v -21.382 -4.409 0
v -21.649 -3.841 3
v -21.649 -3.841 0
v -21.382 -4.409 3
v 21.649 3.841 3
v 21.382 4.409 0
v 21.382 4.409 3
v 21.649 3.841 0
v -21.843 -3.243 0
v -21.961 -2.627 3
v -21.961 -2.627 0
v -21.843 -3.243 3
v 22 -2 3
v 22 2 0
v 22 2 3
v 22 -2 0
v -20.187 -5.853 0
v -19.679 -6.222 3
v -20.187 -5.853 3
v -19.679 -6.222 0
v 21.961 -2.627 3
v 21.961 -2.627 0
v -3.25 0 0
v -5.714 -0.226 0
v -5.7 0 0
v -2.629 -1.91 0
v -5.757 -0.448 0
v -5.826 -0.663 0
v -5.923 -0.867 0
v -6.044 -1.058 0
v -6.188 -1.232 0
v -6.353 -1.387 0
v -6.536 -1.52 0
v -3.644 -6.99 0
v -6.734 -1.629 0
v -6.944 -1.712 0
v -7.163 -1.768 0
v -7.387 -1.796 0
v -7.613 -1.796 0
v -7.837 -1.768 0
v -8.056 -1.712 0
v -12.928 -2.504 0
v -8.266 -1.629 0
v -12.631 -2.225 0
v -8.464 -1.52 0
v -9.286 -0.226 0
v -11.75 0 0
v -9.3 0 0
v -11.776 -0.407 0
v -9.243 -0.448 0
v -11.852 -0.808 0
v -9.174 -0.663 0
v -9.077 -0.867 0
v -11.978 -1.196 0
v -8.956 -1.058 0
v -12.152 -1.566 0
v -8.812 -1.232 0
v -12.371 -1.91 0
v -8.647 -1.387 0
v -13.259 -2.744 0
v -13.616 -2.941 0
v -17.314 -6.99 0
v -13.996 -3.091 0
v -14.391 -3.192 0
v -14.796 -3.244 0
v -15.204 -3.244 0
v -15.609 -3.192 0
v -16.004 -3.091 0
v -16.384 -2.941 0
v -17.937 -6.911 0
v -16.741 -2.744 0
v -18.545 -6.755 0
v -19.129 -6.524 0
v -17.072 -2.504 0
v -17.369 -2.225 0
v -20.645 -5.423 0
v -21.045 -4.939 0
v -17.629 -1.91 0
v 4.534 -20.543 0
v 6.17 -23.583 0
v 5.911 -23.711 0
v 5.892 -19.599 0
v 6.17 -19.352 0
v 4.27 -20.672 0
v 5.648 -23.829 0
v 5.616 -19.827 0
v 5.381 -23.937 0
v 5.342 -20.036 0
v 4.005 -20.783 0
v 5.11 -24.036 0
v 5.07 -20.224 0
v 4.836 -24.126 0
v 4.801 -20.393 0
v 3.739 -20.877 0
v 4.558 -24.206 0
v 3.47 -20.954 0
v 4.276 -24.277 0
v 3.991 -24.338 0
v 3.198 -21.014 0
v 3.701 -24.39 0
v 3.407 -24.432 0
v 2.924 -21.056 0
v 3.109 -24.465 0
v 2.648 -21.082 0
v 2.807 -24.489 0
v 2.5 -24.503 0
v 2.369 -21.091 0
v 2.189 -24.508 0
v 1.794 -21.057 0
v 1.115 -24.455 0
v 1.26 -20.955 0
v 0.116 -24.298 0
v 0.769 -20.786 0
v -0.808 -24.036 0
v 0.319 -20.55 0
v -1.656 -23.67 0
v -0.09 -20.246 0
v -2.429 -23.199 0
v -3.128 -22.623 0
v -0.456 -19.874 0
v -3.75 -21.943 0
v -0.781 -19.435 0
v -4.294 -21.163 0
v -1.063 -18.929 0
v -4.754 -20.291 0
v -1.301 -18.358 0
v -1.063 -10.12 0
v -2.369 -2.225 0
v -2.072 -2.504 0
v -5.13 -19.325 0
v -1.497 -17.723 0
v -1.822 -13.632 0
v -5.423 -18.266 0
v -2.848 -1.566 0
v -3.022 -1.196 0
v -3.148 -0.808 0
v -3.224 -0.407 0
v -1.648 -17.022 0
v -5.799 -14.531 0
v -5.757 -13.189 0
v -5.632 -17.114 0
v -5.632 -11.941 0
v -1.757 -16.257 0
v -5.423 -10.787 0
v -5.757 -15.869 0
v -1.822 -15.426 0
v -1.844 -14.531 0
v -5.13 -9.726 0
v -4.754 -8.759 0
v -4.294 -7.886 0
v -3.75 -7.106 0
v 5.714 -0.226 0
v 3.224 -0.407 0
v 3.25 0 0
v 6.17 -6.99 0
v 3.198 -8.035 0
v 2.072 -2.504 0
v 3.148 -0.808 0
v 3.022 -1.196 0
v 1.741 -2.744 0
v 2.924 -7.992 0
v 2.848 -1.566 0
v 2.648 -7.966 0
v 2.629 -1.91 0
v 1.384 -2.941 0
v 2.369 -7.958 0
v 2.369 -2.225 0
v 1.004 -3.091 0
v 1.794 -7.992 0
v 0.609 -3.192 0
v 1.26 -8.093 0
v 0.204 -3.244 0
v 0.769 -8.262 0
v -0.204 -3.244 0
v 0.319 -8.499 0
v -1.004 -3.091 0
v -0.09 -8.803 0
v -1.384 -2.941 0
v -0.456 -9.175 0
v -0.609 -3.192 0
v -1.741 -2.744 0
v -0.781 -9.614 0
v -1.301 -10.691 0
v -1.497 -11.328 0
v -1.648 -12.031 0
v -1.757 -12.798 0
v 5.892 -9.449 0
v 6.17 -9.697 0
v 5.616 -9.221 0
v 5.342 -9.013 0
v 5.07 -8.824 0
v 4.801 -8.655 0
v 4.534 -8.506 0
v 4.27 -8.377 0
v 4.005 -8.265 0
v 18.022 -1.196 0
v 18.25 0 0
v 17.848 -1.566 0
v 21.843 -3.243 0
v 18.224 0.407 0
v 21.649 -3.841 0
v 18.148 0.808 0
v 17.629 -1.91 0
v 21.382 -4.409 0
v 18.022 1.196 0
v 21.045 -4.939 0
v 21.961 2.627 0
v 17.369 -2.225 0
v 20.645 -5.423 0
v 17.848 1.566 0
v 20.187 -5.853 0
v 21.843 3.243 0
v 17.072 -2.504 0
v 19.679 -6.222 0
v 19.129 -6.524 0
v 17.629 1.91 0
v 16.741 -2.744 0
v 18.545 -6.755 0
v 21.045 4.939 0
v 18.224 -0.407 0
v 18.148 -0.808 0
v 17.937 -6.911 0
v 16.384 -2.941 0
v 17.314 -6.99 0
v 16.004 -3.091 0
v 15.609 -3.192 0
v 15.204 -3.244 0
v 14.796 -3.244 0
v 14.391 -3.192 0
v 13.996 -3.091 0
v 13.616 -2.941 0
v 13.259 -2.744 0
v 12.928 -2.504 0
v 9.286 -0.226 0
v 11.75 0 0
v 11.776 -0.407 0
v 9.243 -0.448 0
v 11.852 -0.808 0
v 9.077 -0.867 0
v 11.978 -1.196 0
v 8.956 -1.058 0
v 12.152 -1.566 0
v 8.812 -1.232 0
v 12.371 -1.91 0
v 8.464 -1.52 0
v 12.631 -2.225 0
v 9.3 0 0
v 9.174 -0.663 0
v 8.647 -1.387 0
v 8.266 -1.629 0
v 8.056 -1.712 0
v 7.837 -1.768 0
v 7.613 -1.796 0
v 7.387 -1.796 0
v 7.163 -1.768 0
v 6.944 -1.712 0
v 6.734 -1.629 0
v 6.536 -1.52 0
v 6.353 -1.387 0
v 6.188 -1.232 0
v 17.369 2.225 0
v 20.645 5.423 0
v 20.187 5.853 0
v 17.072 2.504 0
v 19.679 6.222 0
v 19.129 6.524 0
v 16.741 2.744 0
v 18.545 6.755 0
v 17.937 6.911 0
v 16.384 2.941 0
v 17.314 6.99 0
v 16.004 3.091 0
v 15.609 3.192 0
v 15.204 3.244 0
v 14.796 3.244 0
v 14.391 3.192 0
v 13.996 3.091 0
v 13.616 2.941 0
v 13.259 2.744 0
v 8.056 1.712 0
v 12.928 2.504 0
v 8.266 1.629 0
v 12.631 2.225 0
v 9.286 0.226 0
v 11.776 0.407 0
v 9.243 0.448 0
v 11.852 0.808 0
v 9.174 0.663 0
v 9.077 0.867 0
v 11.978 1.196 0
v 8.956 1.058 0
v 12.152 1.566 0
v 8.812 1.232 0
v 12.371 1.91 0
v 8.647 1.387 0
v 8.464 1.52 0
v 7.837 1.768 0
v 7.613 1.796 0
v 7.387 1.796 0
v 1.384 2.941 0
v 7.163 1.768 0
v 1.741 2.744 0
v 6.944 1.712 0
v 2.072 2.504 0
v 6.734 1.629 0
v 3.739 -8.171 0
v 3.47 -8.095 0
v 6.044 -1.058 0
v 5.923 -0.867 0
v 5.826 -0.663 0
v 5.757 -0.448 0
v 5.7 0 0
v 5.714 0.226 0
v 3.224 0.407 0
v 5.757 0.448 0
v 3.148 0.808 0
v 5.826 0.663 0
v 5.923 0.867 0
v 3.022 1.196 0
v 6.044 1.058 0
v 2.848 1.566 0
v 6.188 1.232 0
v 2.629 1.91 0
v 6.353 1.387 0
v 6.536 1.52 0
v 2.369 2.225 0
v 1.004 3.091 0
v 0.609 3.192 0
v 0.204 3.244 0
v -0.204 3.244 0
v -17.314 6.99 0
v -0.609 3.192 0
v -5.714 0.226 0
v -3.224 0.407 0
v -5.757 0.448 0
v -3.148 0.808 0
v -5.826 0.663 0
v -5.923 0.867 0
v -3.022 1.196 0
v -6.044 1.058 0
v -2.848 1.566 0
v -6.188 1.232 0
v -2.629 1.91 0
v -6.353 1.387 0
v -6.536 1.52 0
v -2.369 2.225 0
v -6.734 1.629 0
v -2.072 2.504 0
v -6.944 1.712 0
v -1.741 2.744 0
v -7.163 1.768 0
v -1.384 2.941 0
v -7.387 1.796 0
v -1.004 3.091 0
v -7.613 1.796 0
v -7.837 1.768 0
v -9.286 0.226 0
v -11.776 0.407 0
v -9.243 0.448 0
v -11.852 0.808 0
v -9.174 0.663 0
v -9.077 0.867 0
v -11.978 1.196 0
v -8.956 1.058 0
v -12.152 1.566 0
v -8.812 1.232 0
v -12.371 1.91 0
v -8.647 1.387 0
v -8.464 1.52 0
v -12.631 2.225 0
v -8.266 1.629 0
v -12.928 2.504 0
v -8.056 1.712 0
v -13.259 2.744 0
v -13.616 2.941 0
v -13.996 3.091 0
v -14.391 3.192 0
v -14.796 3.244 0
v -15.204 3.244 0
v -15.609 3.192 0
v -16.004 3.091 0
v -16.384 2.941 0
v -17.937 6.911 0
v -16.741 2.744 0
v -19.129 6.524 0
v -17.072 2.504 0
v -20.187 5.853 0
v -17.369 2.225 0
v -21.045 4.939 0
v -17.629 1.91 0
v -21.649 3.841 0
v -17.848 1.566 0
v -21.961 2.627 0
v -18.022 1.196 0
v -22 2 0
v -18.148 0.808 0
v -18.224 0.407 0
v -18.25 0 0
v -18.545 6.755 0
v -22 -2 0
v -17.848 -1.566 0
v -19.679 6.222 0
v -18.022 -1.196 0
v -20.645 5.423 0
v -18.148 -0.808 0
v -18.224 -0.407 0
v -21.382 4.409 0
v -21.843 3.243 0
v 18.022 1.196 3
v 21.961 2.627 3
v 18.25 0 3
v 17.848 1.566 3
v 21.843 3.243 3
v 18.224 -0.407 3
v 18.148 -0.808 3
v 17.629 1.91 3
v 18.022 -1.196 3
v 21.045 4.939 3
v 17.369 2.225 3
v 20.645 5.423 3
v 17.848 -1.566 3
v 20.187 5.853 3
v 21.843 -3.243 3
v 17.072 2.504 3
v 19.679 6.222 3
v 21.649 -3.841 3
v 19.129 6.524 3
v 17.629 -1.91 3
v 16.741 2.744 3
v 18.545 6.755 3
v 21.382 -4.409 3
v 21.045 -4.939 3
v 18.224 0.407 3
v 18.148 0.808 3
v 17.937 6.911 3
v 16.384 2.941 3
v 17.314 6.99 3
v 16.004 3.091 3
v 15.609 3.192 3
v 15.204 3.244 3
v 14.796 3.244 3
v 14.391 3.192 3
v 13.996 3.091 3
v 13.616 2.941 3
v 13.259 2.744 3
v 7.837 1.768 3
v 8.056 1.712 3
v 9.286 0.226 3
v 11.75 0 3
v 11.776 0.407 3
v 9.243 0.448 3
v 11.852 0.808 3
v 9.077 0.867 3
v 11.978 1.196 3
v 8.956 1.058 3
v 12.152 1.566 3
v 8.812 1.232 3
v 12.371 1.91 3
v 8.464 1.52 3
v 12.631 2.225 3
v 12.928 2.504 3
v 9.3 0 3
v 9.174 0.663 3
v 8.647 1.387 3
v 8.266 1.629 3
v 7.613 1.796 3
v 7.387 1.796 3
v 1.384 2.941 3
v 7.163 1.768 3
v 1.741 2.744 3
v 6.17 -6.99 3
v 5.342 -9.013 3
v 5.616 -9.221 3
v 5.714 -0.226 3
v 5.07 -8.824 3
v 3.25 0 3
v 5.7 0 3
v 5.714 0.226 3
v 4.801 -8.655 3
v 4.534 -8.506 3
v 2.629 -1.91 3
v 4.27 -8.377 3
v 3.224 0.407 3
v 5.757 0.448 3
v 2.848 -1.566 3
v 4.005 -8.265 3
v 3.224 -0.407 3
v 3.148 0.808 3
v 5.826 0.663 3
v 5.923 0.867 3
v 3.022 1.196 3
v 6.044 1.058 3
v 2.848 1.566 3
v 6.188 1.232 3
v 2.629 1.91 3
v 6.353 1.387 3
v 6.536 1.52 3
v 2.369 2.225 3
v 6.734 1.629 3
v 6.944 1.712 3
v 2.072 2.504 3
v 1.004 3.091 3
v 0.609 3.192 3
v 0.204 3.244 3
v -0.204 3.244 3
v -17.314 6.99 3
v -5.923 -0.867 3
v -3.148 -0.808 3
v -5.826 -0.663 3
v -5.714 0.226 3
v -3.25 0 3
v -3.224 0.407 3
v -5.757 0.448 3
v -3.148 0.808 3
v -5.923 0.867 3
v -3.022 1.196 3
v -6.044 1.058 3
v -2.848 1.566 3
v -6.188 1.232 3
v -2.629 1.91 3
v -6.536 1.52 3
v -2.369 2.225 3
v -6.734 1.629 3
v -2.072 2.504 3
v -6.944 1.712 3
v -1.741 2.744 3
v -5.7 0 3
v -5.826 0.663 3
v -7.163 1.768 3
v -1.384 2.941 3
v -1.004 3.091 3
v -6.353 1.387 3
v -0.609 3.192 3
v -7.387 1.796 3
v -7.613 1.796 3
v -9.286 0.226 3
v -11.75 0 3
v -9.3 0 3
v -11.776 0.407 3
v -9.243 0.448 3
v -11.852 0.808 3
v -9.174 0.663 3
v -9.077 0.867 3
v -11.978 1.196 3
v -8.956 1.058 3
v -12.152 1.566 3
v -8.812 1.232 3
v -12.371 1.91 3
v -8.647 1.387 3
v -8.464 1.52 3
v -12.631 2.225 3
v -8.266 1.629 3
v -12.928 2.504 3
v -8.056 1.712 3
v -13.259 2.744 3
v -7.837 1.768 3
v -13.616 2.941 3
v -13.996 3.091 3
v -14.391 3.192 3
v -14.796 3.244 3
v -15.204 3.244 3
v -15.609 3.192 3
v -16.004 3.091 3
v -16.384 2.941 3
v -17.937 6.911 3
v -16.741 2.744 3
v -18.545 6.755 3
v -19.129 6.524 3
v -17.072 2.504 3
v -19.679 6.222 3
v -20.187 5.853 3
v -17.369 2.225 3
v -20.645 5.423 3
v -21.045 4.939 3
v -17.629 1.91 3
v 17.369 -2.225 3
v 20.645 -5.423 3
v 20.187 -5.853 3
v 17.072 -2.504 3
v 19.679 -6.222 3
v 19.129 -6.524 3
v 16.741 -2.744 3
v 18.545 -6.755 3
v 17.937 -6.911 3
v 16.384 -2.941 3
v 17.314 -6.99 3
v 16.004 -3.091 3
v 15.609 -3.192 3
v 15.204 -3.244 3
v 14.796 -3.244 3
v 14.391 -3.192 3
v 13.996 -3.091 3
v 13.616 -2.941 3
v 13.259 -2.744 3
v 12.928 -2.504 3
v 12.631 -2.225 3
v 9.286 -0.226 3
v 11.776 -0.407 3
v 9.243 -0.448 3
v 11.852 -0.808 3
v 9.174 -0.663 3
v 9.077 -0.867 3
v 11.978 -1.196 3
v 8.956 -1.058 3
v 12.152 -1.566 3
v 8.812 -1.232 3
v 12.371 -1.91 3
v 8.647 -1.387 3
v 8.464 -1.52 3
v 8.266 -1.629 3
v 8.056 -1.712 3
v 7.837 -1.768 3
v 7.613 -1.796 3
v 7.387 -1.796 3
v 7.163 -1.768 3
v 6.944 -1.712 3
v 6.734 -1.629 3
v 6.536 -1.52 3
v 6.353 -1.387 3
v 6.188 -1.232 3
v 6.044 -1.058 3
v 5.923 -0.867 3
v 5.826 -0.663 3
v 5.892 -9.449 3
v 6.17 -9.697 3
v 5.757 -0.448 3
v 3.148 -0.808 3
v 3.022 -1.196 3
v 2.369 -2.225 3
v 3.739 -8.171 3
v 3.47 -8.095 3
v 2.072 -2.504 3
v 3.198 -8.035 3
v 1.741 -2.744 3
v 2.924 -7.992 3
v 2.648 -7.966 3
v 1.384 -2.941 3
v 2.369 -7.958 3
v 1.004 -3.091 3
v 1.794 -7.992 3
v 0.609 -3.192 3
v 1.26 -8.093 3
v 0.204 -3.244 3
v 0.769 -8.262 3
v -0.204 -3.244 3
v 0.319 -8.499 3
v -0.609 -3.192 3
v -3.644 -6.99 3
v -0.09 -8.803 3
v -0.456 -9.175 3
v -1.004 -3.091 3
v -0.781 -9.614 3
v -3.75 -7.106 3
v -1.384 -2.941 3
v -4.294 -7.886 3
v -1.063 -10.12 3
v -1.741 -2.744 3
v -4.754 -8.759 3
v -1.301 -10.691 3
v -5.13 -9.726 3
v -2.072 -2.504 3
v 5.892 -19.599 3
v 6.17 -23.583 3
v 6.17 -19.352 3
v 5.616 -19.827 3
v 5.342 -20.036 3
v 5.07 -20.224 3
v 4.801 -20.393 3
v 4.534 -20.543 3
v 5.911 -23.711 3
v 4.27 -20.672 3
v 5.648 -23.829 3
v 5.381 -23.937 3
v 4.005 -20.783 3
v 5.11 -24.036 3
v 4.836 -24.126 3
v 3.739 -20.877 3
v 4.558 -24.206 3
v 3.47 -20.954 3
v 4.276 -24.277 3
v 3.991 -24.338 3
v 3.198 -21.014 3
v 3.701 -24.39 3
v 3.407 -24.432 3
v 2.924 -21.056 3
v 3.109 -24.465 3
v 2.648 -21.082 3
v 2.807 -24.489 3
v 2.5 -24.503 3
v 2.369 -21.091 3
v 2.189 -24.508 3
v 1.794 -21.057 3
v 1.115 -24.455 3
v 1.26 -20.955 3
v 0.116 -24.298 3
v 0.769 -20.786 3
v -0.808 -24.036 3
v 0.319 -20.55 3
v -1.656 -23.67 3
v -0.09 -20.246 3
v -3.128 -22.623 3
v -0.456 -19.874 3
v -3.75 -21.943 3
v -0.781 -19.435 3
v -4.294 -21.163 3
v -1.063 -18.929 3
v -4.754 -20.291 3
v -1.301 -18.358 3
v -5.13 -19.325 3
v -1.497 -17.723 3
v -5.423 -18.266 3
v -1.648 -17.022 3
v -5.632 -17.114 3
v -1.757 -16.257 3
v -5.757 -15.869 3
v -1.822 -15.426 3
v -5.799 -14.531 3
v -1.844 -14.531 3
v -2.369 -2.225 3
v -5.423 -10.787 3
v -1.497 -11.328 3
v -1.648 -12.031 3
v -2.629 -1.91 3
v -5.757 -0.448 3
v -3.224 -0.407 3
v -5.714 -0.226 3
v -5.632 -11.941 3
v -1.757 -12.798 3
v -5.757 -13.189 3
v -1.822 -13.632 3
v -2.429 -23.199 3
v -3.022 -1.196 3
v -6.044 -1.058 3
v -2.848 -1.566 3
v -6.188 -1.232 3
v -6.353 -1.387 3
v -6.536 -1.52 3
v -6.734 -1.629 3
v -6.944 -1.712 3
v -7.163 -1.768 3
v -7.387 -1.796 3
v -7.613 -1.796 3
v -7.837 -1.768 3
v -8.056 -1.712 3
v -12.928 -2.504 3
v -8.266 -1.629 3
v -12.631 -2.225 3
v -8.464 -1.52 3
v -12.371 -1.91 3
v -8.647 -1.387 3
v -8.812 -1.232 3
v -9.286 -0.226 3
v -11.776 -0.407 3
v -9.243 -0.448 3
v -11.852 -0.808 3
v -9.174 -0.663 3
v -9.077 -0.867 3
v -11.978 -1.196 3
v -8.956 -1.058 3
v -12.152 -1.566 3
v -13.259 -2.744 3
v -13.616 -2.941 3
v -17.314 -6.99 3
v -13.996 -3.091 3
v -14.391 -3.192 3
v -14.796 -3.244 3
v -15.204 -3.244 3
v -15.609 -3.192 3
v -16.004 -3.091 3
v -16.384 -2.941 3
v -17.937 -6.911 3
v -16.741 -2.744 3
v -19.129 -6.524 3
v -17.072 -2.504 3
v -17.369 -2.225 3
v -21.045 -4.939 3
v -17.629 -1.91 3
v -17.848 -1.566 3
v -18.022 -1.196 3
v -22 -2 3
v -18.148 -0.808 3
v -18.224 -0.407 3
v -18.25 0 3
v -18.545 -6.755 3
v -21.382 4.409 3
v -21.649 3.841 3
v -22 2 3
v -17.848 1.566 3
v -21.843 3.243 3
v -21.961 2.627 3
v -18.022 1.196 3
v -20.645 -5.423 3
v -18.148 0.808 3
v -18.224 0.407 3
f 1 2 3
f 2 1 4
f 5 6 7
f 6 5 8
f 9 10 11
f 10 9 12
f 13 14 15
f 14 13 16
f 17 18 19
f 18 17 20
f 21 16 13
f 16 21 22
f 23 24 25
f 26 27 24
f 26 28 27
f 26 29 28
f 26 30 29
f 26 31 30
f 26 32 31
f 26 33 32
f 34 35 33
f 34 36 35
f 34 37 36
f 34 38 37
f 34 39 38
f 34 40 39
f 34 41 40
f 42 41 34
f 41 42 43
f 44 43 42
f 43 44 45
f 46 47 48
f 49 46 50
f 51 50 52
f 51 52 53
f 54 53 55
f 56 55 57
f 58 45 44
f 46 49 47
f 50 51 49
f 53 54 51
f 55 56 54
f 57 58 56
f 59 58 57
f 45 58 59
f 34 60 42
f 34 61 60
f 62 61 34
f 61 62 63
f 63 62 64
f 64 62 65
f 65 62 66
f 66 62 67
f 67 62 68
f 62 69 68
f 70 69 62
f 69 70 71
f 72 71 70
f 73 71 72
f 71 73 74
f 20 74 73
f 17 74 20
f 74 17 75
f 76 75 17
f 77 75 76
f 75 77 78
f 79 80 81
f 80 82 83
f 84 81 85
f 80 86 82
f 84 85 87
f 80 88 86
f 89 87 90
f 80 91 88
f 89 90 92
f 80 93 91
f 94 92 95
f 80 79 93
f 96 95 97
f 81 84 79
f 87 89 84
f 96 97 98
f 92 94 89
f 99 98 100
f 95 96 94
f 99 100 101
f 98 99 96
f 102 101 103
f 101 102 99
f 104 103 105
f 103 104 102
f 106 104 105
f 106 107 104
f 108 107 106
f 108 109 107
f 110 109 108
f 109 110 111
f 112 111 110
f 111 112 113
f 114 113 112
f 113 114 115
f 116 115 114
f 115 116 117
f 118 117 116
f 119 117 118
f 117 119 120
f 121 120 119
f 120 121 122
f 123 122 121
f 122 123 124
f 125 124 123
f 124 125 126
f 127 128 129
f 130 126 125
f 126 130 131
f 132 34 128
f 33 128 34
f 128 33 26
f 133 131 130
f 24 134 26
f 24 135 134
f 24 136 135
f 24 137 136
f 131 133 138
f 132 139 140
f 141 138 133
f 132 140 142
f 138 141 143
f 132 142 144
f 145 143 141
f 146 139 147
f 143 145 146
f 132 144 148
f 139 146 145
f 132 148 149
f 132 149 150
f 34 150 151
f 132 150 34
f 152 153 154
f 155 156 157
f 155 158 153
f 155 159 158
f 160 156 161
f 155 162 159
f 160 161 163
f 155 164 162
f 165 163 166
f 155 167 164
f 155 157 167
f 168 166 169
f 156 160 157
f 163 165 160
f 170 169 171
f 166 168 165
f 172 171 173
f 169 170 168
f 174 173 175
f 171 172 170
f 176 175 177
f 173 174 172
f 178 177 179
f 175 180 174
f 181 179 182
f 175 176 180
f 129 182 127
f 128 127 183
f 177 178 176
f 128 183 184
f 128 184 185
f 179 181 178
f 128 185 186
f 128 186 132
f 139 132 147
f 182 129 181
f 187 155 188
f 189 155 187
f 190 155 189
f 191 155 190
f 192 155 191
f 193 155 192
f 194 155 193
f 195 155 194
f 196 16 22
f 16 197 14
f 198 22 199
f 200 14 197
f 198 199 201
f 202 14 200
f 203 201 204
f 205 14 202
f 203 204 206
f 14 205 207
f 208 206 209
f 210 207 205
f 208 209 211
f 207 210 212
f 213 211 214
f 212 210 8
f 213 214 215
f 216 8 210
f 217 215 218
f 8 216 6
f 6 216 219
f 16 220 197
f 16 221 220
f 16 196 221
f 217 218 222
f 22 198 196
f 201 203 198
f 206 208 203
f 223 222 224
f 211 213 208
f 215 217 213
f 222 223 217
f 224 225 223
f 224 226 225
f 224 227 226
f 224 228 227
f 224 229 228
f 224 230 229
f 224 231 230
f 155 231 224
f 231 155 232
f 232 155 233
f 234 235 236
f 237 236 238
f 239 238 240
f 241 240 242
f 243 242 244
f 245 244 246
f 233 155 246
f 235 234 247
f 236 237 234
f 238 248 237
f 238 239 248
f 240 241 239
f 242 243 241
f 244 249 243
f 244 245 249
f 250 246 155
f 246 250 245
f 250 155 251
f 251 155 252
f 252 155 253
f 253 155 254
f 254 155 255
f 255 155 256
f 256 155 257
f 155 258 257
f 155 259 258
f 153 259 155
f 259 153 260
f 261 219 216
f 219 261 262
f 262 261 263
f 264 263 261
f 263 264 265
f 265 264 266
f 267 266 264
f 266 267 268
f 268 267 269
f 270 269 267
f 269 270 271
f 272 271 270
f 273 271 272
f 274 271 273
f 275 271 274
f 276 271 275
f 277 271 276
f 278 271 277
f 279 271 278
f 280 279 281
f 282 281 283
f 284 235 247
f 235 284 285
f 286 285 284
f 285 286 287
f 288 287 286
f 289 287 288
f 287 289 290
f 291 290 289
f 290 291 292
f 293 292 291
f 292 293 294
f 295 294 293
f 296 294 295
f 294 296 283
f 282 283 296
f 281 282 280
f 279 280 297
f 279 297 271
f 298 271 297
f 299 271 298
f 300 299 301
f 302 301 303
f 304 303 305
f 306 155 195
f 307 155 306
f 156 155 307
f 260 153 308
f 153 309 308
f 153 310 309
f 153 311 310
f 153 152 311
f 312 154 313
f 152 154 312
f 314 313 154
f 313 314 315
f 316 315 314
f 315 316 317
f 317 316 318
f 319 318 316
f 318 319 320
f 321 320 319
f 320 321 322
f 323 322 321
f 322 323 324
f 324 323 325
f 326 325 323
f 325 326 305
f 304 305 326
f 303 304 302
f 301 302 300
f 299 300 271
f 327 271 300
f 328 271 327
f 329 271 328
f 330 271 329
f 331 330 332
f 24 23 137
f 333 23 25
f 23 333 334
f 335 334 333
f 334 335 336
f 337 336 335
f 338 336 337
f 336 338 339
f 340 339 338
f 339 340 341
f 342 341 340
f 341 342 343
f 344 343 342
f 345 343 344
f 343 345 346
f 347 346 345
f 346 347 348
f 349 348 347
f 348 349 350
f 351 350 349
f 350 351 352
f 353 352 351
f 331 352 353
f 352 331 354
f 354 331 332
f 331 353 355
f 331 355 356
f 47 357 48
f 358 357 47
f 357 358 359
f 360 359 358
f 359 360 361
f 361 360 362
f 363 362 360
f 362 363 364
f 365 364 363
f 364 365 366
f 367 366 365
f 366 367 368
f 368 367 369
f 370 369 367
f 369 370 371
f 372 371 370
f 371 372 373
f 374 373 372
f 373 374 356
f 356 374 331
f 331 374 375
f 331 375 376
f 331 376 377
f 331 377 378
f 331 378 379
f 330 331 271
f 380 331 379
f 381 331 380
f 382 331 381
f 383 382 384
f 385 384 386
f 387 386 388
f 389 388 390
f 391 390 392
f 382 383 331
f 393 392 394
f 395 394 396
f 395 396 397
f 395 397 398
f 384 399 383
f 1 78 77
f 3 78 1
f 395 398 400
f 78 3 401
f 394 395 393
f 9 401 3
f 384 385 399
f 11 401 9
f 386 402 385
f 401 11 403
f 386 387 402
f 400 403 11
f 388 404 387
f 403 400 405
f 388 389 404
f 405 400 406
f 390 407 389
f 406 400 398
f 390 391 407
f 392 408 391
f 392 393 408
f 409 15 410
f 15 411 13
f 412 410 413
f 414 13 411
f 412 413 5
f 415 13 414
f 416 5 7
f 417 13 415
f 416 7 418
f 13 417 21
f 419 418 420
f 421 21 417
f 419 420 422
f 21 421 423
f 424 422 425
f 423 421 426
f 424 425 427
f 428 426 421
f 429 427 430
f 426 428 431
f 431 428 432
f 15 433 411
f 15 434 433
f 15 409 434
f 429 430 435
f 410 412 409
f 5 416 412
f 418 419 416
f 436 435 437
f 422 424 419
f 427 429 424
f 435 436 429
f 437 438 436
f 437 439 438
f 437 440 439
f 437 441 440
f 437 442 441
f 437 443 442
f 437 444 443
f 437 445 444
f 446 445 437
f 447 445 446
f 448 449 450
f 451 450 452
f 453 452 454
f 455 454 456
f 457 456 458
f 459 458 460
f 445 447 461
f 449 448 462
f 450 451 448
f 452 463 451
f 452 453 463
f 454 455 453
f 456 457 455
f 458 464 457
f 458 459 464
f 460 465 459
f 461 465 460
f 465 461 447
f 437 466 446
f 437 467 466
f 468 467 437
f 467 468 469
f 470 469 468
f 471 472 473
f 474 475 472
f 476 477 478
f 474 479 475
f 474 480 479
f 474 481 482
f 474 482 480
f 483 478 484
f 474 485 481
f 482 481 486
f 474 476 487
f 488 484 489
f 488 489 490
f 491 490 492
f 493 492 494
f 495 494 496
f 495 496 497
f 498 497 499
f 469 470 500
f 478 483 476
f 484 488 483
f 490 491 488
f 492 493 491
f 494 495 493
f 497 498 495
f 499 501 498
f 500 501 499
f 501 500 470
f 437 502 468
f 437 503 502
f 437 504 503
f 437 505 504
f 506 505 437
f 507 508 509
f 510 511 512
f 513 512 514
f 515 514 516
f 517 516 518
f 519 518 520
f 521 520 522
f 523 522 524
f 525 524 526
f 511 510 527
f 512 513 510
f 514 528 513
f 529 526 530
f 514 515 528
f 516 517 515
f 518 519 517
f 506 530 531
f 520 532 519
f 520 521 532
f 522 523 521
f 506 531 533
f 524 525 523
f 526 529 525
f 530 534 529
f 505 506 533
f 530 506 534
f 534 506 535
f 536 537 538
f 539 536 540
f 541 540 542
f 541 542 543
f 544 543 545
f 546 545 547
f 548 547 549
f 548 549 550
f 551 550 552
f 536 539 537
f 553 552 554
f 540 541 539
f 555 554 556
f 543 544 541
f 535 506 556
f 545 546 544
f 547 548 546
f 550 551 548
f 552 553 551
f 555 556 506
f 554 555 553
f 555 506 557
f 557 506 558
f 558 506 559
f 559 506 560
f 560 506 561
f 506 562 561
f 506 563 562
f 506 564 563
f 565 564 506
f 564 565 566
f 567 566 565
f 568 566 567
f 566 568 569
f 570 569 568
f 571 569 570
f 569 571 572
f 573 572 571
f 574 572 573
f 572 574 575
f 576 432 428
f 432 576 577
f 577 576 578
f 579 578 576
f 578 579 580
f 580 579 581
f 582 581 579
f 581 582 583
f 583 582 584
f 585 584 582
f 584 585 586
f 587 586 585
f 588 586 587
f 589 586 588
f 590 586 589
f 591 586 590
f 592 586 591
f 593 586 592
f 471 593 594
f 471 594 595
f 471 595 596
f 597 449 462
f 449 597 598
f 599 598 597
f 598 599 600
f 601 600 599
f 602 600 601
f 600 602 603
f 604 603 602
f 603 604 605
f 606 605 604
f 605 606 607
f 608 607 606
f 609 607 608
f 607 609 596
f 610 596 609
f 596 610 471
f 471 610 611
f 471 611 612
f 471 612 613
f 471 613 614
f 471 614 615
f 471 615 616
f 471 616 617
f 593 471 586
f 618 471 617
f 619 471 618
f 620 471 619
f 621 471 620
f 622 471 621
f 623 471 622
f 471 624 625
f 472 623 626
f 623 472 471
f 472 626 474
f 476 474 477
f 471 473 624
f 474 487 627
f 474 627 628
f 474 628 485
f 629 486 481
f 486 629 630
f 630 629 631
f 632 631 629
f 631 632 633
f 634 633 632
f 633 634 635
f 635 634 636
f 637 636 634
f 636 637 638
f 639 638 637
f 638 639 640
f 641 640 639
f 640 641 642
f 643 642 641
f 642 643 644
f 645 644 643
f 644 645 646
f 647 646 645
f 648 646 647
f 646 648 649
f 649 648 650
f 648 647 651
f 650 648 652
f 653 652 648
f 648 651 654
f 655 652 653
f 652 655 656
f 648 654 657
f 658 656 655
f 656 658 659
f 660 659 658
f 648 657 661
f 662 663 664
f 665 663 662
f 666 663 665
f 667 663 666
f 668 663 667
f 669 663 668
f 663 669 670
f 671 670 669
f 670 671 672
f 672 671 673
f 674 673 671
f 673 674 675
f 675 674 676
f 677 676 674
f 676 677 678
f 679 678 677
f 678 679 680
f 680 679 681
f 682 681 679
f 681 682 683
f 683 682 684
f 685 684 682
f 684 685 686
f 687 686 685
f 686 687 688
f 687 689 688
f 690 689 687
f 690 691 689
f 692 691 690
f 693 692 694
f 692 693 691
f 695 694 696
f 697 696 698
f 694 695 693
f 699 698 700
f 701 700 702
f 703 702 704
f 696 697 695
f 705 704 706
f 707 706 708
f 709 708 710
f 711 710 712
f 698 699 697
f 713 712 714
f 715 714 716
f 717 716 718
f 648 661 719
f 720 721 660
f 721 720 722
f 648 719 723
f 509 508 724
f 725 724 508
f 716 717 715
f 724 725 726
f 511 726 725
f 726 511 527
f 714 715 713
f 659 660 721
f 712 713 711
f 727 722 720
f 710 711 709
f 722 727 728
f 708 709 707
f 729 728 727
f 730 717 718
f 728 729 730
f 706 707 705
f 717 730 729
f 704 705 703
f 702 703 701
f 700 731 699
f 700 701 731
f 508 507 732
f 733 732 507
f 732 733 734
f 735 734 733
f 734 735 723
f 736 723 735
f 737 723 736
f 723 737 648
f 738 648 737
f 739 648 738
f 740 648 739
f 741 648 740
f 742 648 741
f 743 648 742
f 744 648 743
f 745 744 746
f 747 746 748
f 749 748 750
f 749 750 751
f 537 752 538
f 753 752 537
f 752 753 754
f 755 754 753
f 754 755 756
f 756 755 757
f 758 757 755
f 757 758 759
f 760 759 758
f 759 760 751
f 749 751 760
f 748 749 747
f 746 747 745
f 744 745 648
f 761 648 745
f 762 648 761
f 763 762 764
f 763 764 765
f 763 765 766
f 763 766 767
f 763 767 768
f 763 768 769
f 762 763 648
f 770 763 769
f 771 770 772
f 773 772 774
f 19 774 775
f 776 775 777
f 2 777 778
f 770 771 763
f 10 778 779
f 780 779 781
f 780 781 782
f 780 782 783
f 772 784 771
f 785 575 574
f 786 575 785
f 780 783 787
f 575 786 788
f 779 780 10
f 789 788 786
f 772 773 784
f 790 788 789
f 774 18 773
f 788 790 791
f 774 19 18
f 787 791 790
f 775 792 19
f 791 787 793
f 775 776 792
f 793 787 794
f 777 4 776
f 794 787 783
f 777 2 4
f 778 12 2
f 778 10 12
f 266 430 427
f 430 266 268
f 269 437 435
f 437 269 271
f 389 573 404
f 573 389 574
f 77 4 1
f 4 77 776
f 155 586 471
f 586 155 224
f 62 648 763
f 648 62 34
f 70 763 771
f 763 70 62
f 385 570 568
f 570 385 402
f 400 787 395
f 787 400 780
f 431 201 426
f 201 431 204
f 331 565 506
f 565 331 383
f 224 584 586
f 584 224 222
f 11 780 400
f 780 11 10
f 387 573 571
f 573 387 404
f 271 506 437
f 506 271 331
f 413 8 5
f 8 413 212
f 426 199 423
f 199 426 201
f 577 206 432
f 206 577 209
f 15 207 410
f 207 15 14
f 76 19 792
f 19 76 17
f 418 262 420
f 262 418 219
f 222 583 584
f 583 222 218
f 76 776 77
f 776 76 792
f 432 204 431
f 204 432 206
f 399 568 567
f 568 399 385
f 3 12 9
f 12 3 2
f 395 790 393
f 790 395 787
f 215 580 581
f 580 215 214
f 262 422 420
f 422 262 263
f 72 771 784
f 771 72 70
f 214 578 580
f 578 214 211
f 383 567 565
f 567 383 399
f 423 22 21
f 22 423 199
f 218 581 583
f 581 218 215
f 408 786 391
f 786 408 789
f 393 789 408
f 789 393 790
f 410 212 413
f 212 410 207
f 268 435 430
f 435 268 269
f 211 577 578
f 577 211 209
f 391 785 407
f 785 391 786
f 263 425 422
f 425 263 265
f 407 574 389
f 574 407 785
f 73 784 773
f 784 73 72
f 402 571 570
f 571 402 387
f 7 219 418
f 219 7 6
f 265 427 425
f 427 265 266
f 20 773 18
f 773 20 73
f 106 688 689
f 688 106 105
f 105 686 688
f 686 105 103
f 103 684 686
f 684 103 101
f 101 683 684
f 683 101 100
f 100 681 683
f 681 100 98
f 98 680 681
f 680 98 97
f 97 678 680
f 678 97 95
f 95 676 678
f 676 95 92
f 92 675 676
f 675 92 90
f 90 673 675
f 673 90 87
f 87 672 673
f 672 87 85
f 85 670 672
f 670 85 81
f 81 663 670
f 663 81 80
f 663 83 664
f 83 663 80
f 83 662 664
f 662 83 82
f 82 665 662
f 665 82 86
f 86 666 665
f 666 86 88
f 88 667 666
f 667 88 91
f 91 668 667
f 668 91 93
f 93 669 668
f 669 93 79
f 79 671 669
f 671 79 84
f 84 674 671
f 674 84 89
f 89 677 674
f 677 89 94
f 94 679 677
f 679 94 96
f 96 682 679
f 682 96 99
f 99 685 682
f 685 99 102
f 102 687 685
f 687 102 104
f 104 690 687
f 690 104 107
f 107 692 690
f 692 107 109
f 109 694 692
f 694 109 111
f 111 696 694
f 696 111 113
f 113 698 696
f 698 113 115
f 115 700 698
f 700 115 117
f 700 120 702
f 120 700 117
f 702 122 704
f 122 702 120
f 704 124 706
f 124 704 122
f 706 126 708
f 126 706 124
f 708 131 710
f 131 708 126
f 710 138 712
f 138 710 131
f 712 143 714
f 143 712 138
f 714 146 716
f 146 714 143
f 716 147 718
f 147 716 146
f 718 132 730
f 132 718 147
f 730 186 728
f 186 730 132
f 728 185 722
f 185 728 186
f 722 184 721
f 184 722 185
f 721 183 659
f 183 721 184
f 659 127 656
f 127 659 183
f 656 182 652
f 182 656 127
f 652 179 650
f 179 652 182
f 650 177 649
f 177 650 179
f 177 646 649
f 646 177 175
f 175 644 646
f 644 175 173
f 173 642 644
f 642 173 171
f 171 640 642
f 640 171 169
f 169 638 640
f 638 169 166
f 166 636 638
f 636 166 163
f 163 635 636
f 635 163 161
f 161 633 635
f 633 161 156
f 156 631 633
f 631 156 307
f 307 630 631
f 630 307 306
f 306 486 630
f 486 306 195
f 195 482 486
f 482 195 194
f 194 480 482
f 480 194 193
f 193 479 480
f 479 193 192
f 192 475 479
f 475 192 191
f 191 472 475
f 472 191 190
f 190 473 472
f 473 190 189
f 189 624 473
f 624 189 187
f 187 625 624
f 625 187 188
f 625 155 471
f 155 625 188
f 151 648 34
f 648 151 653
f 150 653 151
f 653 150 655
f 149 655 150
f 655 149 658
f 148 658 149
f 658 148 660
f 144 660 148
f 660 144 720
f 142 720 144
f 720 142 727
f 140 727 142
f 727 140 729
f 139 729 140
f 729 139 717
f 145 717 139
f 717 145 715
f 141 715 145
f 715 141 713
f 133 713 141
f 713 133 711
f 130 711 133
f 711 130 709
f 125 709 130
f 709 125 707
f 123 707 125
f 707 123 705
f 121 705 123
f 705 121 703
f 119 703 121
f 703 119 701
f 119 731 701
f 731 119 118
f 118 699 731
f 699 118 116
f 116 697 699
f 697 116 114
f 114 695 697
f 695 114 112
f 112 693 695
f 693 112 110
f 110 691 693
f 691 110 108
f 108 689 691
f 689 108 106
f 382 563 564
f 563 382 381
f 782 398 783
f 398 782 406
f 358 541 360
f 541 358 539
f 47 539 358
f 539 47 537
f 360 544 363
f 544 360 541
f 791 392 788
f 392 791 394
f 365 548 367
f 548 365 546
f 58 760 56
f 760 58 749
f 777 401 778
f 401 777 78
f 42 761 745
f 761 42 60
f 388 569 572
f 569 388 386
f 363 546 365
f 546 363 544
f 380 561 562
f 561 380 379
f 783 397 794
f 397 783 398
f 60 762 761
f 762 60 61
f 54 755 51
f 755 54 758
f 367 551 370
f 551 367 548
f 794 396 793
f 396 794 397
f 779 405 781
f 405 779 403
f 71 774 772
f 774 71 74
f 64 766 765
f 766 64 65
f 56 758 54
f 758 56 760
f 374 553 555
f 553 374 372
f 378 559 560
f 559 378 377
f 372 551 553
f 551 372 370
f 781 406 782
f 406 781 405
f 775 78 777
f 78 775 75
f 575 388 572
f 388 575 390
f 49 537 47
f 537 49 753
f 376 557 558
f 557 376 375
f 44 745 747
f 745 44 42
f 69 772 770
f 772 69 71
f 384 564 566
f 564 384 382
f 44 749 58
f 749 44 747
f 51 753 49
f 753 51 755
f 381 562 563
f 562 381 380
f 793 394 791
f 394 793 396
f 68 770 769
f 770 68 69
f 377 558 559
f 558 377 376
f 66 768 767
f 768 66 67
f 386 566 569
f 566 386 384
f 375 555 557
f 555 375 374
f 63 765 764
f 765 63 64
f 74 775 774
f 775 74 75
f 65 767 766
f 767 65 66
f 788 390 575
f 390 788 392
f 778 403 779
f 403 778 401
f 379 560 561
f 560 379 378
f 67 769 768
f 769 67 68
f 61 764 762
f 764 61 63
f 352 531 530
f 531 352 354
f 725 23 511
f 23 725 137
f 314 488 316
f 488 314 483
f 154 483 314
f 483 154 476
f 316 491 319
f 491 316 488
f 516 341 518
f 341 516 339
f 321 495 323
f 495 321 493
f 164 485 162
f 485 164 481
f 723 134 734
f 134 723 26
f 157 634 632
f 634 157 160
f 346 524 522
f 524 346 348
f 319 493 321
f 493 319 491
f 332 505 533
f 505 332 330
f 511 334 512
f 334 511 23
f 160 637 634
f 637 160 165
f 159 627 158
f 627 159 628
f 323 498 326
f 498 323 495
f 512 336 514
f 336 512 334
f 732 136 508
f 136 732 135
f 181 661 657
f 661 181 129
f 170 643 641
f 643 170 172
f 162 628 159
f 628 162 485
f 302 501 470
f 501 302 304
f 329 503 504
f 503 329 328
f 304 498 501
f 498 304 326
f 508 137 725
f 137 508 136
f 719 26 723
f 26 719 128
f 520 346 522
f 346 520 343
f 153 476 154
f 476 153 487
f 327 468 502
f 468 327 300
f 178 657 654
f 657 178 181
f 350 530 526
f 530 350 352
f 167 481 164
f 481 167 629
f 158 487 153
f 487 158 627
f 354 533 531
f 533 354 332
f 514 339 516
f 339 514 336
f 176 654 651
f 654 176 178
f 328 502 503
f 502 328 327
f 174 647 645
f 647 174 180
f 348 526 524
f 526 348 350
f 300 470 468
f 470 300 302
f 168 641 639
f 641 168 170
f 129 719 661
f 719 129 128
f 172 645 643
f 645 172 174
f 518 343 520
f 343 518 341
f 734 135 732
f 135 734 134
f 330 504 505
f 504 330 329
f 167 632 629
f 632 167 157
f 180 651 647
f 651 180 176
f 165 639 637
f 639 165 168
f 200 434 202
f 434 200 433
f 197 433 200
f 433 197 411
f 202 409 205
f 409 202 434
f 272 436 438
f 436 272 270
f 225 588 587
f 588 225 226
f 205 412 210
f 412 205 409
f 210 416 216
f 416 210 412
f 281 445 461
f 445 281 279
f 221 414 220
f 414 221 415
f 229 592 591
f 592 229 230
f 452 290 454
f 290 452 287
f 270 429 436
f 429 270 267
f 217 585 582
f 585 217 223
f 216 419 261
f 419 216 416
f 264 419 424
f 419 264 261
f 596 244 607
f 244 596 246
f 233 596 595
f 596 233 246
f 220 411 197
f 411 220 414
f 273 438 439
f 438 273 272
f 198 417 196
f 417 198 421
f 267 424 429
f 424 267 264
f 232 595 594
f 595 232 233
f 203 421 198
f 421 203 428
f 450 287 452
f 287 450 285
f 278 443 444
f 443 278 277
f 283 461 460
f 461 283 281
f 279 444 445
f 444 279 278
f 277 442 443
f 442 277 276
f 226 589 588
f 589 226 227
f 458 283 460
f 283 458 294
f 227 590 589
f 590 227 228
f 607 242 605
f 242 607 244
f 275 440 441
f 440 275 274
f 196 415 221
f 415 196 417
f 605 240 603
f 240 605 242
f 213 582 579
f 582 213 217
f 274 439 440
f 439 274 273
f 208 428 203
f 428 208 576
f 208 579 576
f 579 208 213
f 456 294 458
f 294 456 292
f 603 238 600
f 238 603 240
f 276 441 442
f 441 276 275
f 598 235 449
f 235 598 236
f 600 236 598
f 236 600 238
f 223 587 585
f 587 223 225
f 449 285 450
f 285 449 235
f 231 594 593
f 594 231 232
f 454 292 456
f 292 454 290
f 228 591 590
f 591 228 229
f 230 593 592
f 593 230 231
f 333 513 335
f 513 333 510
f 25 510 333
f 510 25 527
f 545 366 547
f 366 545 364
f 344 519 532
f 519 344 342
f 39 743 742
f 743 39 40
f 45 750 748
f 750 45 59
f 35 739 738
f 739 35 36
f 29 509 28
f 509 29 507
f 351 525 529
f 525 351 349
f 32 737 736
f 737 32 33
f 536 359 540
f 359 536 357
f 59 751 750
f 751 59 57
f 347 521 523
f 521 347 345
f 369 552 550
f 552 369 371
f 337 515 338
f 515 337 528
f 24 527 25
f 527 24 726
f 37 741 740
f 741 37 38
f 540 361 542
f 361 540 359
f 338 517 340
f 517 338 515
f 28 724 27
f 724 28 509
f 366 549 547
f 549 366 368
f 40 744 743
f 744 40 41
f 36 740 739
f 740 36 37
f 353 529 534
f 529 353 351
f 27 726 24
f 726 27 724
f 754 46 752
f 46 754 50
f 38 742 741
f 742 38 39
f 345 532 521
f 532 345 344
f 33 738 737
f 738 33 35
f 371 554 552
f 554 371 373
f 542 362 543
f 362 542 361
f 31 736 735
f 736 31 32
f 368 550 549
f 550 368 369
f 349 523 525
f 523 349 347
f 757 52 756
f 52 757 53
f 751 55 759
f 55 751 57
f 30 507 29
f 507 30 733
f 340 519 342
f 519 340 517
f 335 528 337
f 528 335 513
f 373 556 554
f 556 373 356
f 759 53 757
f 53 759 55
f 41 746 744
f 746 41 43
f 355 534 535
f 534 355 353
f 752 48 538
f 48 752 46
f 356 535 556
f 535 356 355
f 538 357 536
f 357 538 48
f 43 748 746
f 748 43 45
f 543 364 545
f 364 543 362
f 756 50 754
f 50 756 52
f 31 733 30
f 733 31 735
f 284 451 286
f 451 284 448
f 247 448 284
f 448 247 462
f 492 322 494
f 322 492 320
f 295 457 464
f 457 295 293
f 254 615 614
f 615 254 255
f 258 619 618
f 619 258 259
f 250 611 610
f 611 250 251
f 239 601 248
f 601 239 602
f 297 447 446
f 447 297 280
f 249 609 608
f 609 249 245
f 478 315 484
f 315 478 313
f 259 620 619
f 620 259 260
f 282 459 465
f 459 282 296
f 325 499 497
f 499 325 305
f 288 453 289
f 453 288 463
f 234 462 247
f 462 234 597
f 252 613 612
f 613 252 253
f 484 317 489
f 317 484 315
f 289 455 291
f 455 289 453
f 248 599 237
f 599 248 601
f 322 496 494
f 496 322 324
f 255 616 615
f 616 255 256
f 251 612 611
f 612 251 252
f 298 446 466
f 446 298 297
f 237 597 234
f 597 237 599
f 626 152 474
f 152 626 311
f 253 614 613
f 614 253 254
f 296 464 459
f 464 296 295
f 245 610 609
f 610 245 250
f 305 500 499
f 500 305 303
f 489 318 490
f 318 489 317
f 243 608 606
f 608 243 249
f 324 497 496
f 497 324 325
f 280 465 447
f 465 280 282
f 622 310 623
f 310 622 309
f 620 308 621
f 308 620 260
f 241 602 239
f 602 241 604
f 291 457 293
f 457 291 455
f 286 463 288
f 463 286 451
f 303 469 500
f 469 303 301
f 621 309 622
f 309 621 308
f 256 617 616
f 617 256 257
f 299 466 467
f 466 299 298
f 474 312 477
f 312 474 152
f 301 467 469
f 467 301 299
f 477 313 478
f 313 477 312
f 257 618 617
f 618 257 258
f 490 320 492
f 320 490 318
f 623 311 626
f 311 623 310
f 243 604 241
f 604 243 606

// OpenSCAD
$fn = 50;


difference() {
	union() {
		hull() {
			translate(v = [-17.0000000000, 2.0000000000, 0]) {
				cylinder(h = 3, r = 5);
			}
			translate(v = [17.0000000000, 2.0000000000, 0]) {
				cylinder(h = 3, r = 5);
			}
			translate(v = [-17.0000000000, -2.0000000000, 0]) {
				cylinder(h = 3, r = 5);
			}
			translate(v = [17.0000000000, -2.0000000000, 0]) {
				cylinder(h = 3, r = 5);
			}
		}
		translate(v = [0, -5, 0]) {
			linear_extrude(height = 3) {
				text(font = "DejaVu Sans Mono:style=Bold", halign = "center", size = 19.0000000000, text = "C", valign = "top");
			}
		}
	}
	union() {
		translate(v = [-15.0000000000, 0.0000000000, 0]) {
			translate(v = [0, 0, -100]) {
				cylinder(h = 200, r = 3.2500000000);
			}
		}
		translate(v = [0, 0, -100]) {
			cylinder(h = 200, r = 3.2500000000);
		}
		translate(v = [15.0000000000, 0.0000000000, 0]) {
			translate(v = [0, 0, -100]) {
				cylinder(h = 200, r = 3.2500000000);
			}
		}
		translate(v = [-15.0000000000, 0.0000000000, 0]) {
			translate(v = [0, 0, -100]) {
				cylinder(h = 200, r = 1.8000000000);
			}
		}
		translate(v = [-7.5000000000, 0.0000000000, 0]) {
			translate(v = [0, 0, -100]) {
				cylinder(h = 200, r = 1.8000000000);
			}
		}
		translate(v = [0, 0, -100]) {
			cylinder(h = 200, r = 1.8000000000);
		}
		translate(v = [7.5000000000, 0.0000000000, 0]) {
			translate(v = [0, 0, -100]) {
				cylinder(h = 200, r = 1.8000000000);
			}
		}
		translate(v = [15.0000000000, 0.0000000000, 0]) {
			translate(v = [0, 0, -100]) {
				cylinder(h = 200, r = 1.8000000000);
			}
		}
	}
}
